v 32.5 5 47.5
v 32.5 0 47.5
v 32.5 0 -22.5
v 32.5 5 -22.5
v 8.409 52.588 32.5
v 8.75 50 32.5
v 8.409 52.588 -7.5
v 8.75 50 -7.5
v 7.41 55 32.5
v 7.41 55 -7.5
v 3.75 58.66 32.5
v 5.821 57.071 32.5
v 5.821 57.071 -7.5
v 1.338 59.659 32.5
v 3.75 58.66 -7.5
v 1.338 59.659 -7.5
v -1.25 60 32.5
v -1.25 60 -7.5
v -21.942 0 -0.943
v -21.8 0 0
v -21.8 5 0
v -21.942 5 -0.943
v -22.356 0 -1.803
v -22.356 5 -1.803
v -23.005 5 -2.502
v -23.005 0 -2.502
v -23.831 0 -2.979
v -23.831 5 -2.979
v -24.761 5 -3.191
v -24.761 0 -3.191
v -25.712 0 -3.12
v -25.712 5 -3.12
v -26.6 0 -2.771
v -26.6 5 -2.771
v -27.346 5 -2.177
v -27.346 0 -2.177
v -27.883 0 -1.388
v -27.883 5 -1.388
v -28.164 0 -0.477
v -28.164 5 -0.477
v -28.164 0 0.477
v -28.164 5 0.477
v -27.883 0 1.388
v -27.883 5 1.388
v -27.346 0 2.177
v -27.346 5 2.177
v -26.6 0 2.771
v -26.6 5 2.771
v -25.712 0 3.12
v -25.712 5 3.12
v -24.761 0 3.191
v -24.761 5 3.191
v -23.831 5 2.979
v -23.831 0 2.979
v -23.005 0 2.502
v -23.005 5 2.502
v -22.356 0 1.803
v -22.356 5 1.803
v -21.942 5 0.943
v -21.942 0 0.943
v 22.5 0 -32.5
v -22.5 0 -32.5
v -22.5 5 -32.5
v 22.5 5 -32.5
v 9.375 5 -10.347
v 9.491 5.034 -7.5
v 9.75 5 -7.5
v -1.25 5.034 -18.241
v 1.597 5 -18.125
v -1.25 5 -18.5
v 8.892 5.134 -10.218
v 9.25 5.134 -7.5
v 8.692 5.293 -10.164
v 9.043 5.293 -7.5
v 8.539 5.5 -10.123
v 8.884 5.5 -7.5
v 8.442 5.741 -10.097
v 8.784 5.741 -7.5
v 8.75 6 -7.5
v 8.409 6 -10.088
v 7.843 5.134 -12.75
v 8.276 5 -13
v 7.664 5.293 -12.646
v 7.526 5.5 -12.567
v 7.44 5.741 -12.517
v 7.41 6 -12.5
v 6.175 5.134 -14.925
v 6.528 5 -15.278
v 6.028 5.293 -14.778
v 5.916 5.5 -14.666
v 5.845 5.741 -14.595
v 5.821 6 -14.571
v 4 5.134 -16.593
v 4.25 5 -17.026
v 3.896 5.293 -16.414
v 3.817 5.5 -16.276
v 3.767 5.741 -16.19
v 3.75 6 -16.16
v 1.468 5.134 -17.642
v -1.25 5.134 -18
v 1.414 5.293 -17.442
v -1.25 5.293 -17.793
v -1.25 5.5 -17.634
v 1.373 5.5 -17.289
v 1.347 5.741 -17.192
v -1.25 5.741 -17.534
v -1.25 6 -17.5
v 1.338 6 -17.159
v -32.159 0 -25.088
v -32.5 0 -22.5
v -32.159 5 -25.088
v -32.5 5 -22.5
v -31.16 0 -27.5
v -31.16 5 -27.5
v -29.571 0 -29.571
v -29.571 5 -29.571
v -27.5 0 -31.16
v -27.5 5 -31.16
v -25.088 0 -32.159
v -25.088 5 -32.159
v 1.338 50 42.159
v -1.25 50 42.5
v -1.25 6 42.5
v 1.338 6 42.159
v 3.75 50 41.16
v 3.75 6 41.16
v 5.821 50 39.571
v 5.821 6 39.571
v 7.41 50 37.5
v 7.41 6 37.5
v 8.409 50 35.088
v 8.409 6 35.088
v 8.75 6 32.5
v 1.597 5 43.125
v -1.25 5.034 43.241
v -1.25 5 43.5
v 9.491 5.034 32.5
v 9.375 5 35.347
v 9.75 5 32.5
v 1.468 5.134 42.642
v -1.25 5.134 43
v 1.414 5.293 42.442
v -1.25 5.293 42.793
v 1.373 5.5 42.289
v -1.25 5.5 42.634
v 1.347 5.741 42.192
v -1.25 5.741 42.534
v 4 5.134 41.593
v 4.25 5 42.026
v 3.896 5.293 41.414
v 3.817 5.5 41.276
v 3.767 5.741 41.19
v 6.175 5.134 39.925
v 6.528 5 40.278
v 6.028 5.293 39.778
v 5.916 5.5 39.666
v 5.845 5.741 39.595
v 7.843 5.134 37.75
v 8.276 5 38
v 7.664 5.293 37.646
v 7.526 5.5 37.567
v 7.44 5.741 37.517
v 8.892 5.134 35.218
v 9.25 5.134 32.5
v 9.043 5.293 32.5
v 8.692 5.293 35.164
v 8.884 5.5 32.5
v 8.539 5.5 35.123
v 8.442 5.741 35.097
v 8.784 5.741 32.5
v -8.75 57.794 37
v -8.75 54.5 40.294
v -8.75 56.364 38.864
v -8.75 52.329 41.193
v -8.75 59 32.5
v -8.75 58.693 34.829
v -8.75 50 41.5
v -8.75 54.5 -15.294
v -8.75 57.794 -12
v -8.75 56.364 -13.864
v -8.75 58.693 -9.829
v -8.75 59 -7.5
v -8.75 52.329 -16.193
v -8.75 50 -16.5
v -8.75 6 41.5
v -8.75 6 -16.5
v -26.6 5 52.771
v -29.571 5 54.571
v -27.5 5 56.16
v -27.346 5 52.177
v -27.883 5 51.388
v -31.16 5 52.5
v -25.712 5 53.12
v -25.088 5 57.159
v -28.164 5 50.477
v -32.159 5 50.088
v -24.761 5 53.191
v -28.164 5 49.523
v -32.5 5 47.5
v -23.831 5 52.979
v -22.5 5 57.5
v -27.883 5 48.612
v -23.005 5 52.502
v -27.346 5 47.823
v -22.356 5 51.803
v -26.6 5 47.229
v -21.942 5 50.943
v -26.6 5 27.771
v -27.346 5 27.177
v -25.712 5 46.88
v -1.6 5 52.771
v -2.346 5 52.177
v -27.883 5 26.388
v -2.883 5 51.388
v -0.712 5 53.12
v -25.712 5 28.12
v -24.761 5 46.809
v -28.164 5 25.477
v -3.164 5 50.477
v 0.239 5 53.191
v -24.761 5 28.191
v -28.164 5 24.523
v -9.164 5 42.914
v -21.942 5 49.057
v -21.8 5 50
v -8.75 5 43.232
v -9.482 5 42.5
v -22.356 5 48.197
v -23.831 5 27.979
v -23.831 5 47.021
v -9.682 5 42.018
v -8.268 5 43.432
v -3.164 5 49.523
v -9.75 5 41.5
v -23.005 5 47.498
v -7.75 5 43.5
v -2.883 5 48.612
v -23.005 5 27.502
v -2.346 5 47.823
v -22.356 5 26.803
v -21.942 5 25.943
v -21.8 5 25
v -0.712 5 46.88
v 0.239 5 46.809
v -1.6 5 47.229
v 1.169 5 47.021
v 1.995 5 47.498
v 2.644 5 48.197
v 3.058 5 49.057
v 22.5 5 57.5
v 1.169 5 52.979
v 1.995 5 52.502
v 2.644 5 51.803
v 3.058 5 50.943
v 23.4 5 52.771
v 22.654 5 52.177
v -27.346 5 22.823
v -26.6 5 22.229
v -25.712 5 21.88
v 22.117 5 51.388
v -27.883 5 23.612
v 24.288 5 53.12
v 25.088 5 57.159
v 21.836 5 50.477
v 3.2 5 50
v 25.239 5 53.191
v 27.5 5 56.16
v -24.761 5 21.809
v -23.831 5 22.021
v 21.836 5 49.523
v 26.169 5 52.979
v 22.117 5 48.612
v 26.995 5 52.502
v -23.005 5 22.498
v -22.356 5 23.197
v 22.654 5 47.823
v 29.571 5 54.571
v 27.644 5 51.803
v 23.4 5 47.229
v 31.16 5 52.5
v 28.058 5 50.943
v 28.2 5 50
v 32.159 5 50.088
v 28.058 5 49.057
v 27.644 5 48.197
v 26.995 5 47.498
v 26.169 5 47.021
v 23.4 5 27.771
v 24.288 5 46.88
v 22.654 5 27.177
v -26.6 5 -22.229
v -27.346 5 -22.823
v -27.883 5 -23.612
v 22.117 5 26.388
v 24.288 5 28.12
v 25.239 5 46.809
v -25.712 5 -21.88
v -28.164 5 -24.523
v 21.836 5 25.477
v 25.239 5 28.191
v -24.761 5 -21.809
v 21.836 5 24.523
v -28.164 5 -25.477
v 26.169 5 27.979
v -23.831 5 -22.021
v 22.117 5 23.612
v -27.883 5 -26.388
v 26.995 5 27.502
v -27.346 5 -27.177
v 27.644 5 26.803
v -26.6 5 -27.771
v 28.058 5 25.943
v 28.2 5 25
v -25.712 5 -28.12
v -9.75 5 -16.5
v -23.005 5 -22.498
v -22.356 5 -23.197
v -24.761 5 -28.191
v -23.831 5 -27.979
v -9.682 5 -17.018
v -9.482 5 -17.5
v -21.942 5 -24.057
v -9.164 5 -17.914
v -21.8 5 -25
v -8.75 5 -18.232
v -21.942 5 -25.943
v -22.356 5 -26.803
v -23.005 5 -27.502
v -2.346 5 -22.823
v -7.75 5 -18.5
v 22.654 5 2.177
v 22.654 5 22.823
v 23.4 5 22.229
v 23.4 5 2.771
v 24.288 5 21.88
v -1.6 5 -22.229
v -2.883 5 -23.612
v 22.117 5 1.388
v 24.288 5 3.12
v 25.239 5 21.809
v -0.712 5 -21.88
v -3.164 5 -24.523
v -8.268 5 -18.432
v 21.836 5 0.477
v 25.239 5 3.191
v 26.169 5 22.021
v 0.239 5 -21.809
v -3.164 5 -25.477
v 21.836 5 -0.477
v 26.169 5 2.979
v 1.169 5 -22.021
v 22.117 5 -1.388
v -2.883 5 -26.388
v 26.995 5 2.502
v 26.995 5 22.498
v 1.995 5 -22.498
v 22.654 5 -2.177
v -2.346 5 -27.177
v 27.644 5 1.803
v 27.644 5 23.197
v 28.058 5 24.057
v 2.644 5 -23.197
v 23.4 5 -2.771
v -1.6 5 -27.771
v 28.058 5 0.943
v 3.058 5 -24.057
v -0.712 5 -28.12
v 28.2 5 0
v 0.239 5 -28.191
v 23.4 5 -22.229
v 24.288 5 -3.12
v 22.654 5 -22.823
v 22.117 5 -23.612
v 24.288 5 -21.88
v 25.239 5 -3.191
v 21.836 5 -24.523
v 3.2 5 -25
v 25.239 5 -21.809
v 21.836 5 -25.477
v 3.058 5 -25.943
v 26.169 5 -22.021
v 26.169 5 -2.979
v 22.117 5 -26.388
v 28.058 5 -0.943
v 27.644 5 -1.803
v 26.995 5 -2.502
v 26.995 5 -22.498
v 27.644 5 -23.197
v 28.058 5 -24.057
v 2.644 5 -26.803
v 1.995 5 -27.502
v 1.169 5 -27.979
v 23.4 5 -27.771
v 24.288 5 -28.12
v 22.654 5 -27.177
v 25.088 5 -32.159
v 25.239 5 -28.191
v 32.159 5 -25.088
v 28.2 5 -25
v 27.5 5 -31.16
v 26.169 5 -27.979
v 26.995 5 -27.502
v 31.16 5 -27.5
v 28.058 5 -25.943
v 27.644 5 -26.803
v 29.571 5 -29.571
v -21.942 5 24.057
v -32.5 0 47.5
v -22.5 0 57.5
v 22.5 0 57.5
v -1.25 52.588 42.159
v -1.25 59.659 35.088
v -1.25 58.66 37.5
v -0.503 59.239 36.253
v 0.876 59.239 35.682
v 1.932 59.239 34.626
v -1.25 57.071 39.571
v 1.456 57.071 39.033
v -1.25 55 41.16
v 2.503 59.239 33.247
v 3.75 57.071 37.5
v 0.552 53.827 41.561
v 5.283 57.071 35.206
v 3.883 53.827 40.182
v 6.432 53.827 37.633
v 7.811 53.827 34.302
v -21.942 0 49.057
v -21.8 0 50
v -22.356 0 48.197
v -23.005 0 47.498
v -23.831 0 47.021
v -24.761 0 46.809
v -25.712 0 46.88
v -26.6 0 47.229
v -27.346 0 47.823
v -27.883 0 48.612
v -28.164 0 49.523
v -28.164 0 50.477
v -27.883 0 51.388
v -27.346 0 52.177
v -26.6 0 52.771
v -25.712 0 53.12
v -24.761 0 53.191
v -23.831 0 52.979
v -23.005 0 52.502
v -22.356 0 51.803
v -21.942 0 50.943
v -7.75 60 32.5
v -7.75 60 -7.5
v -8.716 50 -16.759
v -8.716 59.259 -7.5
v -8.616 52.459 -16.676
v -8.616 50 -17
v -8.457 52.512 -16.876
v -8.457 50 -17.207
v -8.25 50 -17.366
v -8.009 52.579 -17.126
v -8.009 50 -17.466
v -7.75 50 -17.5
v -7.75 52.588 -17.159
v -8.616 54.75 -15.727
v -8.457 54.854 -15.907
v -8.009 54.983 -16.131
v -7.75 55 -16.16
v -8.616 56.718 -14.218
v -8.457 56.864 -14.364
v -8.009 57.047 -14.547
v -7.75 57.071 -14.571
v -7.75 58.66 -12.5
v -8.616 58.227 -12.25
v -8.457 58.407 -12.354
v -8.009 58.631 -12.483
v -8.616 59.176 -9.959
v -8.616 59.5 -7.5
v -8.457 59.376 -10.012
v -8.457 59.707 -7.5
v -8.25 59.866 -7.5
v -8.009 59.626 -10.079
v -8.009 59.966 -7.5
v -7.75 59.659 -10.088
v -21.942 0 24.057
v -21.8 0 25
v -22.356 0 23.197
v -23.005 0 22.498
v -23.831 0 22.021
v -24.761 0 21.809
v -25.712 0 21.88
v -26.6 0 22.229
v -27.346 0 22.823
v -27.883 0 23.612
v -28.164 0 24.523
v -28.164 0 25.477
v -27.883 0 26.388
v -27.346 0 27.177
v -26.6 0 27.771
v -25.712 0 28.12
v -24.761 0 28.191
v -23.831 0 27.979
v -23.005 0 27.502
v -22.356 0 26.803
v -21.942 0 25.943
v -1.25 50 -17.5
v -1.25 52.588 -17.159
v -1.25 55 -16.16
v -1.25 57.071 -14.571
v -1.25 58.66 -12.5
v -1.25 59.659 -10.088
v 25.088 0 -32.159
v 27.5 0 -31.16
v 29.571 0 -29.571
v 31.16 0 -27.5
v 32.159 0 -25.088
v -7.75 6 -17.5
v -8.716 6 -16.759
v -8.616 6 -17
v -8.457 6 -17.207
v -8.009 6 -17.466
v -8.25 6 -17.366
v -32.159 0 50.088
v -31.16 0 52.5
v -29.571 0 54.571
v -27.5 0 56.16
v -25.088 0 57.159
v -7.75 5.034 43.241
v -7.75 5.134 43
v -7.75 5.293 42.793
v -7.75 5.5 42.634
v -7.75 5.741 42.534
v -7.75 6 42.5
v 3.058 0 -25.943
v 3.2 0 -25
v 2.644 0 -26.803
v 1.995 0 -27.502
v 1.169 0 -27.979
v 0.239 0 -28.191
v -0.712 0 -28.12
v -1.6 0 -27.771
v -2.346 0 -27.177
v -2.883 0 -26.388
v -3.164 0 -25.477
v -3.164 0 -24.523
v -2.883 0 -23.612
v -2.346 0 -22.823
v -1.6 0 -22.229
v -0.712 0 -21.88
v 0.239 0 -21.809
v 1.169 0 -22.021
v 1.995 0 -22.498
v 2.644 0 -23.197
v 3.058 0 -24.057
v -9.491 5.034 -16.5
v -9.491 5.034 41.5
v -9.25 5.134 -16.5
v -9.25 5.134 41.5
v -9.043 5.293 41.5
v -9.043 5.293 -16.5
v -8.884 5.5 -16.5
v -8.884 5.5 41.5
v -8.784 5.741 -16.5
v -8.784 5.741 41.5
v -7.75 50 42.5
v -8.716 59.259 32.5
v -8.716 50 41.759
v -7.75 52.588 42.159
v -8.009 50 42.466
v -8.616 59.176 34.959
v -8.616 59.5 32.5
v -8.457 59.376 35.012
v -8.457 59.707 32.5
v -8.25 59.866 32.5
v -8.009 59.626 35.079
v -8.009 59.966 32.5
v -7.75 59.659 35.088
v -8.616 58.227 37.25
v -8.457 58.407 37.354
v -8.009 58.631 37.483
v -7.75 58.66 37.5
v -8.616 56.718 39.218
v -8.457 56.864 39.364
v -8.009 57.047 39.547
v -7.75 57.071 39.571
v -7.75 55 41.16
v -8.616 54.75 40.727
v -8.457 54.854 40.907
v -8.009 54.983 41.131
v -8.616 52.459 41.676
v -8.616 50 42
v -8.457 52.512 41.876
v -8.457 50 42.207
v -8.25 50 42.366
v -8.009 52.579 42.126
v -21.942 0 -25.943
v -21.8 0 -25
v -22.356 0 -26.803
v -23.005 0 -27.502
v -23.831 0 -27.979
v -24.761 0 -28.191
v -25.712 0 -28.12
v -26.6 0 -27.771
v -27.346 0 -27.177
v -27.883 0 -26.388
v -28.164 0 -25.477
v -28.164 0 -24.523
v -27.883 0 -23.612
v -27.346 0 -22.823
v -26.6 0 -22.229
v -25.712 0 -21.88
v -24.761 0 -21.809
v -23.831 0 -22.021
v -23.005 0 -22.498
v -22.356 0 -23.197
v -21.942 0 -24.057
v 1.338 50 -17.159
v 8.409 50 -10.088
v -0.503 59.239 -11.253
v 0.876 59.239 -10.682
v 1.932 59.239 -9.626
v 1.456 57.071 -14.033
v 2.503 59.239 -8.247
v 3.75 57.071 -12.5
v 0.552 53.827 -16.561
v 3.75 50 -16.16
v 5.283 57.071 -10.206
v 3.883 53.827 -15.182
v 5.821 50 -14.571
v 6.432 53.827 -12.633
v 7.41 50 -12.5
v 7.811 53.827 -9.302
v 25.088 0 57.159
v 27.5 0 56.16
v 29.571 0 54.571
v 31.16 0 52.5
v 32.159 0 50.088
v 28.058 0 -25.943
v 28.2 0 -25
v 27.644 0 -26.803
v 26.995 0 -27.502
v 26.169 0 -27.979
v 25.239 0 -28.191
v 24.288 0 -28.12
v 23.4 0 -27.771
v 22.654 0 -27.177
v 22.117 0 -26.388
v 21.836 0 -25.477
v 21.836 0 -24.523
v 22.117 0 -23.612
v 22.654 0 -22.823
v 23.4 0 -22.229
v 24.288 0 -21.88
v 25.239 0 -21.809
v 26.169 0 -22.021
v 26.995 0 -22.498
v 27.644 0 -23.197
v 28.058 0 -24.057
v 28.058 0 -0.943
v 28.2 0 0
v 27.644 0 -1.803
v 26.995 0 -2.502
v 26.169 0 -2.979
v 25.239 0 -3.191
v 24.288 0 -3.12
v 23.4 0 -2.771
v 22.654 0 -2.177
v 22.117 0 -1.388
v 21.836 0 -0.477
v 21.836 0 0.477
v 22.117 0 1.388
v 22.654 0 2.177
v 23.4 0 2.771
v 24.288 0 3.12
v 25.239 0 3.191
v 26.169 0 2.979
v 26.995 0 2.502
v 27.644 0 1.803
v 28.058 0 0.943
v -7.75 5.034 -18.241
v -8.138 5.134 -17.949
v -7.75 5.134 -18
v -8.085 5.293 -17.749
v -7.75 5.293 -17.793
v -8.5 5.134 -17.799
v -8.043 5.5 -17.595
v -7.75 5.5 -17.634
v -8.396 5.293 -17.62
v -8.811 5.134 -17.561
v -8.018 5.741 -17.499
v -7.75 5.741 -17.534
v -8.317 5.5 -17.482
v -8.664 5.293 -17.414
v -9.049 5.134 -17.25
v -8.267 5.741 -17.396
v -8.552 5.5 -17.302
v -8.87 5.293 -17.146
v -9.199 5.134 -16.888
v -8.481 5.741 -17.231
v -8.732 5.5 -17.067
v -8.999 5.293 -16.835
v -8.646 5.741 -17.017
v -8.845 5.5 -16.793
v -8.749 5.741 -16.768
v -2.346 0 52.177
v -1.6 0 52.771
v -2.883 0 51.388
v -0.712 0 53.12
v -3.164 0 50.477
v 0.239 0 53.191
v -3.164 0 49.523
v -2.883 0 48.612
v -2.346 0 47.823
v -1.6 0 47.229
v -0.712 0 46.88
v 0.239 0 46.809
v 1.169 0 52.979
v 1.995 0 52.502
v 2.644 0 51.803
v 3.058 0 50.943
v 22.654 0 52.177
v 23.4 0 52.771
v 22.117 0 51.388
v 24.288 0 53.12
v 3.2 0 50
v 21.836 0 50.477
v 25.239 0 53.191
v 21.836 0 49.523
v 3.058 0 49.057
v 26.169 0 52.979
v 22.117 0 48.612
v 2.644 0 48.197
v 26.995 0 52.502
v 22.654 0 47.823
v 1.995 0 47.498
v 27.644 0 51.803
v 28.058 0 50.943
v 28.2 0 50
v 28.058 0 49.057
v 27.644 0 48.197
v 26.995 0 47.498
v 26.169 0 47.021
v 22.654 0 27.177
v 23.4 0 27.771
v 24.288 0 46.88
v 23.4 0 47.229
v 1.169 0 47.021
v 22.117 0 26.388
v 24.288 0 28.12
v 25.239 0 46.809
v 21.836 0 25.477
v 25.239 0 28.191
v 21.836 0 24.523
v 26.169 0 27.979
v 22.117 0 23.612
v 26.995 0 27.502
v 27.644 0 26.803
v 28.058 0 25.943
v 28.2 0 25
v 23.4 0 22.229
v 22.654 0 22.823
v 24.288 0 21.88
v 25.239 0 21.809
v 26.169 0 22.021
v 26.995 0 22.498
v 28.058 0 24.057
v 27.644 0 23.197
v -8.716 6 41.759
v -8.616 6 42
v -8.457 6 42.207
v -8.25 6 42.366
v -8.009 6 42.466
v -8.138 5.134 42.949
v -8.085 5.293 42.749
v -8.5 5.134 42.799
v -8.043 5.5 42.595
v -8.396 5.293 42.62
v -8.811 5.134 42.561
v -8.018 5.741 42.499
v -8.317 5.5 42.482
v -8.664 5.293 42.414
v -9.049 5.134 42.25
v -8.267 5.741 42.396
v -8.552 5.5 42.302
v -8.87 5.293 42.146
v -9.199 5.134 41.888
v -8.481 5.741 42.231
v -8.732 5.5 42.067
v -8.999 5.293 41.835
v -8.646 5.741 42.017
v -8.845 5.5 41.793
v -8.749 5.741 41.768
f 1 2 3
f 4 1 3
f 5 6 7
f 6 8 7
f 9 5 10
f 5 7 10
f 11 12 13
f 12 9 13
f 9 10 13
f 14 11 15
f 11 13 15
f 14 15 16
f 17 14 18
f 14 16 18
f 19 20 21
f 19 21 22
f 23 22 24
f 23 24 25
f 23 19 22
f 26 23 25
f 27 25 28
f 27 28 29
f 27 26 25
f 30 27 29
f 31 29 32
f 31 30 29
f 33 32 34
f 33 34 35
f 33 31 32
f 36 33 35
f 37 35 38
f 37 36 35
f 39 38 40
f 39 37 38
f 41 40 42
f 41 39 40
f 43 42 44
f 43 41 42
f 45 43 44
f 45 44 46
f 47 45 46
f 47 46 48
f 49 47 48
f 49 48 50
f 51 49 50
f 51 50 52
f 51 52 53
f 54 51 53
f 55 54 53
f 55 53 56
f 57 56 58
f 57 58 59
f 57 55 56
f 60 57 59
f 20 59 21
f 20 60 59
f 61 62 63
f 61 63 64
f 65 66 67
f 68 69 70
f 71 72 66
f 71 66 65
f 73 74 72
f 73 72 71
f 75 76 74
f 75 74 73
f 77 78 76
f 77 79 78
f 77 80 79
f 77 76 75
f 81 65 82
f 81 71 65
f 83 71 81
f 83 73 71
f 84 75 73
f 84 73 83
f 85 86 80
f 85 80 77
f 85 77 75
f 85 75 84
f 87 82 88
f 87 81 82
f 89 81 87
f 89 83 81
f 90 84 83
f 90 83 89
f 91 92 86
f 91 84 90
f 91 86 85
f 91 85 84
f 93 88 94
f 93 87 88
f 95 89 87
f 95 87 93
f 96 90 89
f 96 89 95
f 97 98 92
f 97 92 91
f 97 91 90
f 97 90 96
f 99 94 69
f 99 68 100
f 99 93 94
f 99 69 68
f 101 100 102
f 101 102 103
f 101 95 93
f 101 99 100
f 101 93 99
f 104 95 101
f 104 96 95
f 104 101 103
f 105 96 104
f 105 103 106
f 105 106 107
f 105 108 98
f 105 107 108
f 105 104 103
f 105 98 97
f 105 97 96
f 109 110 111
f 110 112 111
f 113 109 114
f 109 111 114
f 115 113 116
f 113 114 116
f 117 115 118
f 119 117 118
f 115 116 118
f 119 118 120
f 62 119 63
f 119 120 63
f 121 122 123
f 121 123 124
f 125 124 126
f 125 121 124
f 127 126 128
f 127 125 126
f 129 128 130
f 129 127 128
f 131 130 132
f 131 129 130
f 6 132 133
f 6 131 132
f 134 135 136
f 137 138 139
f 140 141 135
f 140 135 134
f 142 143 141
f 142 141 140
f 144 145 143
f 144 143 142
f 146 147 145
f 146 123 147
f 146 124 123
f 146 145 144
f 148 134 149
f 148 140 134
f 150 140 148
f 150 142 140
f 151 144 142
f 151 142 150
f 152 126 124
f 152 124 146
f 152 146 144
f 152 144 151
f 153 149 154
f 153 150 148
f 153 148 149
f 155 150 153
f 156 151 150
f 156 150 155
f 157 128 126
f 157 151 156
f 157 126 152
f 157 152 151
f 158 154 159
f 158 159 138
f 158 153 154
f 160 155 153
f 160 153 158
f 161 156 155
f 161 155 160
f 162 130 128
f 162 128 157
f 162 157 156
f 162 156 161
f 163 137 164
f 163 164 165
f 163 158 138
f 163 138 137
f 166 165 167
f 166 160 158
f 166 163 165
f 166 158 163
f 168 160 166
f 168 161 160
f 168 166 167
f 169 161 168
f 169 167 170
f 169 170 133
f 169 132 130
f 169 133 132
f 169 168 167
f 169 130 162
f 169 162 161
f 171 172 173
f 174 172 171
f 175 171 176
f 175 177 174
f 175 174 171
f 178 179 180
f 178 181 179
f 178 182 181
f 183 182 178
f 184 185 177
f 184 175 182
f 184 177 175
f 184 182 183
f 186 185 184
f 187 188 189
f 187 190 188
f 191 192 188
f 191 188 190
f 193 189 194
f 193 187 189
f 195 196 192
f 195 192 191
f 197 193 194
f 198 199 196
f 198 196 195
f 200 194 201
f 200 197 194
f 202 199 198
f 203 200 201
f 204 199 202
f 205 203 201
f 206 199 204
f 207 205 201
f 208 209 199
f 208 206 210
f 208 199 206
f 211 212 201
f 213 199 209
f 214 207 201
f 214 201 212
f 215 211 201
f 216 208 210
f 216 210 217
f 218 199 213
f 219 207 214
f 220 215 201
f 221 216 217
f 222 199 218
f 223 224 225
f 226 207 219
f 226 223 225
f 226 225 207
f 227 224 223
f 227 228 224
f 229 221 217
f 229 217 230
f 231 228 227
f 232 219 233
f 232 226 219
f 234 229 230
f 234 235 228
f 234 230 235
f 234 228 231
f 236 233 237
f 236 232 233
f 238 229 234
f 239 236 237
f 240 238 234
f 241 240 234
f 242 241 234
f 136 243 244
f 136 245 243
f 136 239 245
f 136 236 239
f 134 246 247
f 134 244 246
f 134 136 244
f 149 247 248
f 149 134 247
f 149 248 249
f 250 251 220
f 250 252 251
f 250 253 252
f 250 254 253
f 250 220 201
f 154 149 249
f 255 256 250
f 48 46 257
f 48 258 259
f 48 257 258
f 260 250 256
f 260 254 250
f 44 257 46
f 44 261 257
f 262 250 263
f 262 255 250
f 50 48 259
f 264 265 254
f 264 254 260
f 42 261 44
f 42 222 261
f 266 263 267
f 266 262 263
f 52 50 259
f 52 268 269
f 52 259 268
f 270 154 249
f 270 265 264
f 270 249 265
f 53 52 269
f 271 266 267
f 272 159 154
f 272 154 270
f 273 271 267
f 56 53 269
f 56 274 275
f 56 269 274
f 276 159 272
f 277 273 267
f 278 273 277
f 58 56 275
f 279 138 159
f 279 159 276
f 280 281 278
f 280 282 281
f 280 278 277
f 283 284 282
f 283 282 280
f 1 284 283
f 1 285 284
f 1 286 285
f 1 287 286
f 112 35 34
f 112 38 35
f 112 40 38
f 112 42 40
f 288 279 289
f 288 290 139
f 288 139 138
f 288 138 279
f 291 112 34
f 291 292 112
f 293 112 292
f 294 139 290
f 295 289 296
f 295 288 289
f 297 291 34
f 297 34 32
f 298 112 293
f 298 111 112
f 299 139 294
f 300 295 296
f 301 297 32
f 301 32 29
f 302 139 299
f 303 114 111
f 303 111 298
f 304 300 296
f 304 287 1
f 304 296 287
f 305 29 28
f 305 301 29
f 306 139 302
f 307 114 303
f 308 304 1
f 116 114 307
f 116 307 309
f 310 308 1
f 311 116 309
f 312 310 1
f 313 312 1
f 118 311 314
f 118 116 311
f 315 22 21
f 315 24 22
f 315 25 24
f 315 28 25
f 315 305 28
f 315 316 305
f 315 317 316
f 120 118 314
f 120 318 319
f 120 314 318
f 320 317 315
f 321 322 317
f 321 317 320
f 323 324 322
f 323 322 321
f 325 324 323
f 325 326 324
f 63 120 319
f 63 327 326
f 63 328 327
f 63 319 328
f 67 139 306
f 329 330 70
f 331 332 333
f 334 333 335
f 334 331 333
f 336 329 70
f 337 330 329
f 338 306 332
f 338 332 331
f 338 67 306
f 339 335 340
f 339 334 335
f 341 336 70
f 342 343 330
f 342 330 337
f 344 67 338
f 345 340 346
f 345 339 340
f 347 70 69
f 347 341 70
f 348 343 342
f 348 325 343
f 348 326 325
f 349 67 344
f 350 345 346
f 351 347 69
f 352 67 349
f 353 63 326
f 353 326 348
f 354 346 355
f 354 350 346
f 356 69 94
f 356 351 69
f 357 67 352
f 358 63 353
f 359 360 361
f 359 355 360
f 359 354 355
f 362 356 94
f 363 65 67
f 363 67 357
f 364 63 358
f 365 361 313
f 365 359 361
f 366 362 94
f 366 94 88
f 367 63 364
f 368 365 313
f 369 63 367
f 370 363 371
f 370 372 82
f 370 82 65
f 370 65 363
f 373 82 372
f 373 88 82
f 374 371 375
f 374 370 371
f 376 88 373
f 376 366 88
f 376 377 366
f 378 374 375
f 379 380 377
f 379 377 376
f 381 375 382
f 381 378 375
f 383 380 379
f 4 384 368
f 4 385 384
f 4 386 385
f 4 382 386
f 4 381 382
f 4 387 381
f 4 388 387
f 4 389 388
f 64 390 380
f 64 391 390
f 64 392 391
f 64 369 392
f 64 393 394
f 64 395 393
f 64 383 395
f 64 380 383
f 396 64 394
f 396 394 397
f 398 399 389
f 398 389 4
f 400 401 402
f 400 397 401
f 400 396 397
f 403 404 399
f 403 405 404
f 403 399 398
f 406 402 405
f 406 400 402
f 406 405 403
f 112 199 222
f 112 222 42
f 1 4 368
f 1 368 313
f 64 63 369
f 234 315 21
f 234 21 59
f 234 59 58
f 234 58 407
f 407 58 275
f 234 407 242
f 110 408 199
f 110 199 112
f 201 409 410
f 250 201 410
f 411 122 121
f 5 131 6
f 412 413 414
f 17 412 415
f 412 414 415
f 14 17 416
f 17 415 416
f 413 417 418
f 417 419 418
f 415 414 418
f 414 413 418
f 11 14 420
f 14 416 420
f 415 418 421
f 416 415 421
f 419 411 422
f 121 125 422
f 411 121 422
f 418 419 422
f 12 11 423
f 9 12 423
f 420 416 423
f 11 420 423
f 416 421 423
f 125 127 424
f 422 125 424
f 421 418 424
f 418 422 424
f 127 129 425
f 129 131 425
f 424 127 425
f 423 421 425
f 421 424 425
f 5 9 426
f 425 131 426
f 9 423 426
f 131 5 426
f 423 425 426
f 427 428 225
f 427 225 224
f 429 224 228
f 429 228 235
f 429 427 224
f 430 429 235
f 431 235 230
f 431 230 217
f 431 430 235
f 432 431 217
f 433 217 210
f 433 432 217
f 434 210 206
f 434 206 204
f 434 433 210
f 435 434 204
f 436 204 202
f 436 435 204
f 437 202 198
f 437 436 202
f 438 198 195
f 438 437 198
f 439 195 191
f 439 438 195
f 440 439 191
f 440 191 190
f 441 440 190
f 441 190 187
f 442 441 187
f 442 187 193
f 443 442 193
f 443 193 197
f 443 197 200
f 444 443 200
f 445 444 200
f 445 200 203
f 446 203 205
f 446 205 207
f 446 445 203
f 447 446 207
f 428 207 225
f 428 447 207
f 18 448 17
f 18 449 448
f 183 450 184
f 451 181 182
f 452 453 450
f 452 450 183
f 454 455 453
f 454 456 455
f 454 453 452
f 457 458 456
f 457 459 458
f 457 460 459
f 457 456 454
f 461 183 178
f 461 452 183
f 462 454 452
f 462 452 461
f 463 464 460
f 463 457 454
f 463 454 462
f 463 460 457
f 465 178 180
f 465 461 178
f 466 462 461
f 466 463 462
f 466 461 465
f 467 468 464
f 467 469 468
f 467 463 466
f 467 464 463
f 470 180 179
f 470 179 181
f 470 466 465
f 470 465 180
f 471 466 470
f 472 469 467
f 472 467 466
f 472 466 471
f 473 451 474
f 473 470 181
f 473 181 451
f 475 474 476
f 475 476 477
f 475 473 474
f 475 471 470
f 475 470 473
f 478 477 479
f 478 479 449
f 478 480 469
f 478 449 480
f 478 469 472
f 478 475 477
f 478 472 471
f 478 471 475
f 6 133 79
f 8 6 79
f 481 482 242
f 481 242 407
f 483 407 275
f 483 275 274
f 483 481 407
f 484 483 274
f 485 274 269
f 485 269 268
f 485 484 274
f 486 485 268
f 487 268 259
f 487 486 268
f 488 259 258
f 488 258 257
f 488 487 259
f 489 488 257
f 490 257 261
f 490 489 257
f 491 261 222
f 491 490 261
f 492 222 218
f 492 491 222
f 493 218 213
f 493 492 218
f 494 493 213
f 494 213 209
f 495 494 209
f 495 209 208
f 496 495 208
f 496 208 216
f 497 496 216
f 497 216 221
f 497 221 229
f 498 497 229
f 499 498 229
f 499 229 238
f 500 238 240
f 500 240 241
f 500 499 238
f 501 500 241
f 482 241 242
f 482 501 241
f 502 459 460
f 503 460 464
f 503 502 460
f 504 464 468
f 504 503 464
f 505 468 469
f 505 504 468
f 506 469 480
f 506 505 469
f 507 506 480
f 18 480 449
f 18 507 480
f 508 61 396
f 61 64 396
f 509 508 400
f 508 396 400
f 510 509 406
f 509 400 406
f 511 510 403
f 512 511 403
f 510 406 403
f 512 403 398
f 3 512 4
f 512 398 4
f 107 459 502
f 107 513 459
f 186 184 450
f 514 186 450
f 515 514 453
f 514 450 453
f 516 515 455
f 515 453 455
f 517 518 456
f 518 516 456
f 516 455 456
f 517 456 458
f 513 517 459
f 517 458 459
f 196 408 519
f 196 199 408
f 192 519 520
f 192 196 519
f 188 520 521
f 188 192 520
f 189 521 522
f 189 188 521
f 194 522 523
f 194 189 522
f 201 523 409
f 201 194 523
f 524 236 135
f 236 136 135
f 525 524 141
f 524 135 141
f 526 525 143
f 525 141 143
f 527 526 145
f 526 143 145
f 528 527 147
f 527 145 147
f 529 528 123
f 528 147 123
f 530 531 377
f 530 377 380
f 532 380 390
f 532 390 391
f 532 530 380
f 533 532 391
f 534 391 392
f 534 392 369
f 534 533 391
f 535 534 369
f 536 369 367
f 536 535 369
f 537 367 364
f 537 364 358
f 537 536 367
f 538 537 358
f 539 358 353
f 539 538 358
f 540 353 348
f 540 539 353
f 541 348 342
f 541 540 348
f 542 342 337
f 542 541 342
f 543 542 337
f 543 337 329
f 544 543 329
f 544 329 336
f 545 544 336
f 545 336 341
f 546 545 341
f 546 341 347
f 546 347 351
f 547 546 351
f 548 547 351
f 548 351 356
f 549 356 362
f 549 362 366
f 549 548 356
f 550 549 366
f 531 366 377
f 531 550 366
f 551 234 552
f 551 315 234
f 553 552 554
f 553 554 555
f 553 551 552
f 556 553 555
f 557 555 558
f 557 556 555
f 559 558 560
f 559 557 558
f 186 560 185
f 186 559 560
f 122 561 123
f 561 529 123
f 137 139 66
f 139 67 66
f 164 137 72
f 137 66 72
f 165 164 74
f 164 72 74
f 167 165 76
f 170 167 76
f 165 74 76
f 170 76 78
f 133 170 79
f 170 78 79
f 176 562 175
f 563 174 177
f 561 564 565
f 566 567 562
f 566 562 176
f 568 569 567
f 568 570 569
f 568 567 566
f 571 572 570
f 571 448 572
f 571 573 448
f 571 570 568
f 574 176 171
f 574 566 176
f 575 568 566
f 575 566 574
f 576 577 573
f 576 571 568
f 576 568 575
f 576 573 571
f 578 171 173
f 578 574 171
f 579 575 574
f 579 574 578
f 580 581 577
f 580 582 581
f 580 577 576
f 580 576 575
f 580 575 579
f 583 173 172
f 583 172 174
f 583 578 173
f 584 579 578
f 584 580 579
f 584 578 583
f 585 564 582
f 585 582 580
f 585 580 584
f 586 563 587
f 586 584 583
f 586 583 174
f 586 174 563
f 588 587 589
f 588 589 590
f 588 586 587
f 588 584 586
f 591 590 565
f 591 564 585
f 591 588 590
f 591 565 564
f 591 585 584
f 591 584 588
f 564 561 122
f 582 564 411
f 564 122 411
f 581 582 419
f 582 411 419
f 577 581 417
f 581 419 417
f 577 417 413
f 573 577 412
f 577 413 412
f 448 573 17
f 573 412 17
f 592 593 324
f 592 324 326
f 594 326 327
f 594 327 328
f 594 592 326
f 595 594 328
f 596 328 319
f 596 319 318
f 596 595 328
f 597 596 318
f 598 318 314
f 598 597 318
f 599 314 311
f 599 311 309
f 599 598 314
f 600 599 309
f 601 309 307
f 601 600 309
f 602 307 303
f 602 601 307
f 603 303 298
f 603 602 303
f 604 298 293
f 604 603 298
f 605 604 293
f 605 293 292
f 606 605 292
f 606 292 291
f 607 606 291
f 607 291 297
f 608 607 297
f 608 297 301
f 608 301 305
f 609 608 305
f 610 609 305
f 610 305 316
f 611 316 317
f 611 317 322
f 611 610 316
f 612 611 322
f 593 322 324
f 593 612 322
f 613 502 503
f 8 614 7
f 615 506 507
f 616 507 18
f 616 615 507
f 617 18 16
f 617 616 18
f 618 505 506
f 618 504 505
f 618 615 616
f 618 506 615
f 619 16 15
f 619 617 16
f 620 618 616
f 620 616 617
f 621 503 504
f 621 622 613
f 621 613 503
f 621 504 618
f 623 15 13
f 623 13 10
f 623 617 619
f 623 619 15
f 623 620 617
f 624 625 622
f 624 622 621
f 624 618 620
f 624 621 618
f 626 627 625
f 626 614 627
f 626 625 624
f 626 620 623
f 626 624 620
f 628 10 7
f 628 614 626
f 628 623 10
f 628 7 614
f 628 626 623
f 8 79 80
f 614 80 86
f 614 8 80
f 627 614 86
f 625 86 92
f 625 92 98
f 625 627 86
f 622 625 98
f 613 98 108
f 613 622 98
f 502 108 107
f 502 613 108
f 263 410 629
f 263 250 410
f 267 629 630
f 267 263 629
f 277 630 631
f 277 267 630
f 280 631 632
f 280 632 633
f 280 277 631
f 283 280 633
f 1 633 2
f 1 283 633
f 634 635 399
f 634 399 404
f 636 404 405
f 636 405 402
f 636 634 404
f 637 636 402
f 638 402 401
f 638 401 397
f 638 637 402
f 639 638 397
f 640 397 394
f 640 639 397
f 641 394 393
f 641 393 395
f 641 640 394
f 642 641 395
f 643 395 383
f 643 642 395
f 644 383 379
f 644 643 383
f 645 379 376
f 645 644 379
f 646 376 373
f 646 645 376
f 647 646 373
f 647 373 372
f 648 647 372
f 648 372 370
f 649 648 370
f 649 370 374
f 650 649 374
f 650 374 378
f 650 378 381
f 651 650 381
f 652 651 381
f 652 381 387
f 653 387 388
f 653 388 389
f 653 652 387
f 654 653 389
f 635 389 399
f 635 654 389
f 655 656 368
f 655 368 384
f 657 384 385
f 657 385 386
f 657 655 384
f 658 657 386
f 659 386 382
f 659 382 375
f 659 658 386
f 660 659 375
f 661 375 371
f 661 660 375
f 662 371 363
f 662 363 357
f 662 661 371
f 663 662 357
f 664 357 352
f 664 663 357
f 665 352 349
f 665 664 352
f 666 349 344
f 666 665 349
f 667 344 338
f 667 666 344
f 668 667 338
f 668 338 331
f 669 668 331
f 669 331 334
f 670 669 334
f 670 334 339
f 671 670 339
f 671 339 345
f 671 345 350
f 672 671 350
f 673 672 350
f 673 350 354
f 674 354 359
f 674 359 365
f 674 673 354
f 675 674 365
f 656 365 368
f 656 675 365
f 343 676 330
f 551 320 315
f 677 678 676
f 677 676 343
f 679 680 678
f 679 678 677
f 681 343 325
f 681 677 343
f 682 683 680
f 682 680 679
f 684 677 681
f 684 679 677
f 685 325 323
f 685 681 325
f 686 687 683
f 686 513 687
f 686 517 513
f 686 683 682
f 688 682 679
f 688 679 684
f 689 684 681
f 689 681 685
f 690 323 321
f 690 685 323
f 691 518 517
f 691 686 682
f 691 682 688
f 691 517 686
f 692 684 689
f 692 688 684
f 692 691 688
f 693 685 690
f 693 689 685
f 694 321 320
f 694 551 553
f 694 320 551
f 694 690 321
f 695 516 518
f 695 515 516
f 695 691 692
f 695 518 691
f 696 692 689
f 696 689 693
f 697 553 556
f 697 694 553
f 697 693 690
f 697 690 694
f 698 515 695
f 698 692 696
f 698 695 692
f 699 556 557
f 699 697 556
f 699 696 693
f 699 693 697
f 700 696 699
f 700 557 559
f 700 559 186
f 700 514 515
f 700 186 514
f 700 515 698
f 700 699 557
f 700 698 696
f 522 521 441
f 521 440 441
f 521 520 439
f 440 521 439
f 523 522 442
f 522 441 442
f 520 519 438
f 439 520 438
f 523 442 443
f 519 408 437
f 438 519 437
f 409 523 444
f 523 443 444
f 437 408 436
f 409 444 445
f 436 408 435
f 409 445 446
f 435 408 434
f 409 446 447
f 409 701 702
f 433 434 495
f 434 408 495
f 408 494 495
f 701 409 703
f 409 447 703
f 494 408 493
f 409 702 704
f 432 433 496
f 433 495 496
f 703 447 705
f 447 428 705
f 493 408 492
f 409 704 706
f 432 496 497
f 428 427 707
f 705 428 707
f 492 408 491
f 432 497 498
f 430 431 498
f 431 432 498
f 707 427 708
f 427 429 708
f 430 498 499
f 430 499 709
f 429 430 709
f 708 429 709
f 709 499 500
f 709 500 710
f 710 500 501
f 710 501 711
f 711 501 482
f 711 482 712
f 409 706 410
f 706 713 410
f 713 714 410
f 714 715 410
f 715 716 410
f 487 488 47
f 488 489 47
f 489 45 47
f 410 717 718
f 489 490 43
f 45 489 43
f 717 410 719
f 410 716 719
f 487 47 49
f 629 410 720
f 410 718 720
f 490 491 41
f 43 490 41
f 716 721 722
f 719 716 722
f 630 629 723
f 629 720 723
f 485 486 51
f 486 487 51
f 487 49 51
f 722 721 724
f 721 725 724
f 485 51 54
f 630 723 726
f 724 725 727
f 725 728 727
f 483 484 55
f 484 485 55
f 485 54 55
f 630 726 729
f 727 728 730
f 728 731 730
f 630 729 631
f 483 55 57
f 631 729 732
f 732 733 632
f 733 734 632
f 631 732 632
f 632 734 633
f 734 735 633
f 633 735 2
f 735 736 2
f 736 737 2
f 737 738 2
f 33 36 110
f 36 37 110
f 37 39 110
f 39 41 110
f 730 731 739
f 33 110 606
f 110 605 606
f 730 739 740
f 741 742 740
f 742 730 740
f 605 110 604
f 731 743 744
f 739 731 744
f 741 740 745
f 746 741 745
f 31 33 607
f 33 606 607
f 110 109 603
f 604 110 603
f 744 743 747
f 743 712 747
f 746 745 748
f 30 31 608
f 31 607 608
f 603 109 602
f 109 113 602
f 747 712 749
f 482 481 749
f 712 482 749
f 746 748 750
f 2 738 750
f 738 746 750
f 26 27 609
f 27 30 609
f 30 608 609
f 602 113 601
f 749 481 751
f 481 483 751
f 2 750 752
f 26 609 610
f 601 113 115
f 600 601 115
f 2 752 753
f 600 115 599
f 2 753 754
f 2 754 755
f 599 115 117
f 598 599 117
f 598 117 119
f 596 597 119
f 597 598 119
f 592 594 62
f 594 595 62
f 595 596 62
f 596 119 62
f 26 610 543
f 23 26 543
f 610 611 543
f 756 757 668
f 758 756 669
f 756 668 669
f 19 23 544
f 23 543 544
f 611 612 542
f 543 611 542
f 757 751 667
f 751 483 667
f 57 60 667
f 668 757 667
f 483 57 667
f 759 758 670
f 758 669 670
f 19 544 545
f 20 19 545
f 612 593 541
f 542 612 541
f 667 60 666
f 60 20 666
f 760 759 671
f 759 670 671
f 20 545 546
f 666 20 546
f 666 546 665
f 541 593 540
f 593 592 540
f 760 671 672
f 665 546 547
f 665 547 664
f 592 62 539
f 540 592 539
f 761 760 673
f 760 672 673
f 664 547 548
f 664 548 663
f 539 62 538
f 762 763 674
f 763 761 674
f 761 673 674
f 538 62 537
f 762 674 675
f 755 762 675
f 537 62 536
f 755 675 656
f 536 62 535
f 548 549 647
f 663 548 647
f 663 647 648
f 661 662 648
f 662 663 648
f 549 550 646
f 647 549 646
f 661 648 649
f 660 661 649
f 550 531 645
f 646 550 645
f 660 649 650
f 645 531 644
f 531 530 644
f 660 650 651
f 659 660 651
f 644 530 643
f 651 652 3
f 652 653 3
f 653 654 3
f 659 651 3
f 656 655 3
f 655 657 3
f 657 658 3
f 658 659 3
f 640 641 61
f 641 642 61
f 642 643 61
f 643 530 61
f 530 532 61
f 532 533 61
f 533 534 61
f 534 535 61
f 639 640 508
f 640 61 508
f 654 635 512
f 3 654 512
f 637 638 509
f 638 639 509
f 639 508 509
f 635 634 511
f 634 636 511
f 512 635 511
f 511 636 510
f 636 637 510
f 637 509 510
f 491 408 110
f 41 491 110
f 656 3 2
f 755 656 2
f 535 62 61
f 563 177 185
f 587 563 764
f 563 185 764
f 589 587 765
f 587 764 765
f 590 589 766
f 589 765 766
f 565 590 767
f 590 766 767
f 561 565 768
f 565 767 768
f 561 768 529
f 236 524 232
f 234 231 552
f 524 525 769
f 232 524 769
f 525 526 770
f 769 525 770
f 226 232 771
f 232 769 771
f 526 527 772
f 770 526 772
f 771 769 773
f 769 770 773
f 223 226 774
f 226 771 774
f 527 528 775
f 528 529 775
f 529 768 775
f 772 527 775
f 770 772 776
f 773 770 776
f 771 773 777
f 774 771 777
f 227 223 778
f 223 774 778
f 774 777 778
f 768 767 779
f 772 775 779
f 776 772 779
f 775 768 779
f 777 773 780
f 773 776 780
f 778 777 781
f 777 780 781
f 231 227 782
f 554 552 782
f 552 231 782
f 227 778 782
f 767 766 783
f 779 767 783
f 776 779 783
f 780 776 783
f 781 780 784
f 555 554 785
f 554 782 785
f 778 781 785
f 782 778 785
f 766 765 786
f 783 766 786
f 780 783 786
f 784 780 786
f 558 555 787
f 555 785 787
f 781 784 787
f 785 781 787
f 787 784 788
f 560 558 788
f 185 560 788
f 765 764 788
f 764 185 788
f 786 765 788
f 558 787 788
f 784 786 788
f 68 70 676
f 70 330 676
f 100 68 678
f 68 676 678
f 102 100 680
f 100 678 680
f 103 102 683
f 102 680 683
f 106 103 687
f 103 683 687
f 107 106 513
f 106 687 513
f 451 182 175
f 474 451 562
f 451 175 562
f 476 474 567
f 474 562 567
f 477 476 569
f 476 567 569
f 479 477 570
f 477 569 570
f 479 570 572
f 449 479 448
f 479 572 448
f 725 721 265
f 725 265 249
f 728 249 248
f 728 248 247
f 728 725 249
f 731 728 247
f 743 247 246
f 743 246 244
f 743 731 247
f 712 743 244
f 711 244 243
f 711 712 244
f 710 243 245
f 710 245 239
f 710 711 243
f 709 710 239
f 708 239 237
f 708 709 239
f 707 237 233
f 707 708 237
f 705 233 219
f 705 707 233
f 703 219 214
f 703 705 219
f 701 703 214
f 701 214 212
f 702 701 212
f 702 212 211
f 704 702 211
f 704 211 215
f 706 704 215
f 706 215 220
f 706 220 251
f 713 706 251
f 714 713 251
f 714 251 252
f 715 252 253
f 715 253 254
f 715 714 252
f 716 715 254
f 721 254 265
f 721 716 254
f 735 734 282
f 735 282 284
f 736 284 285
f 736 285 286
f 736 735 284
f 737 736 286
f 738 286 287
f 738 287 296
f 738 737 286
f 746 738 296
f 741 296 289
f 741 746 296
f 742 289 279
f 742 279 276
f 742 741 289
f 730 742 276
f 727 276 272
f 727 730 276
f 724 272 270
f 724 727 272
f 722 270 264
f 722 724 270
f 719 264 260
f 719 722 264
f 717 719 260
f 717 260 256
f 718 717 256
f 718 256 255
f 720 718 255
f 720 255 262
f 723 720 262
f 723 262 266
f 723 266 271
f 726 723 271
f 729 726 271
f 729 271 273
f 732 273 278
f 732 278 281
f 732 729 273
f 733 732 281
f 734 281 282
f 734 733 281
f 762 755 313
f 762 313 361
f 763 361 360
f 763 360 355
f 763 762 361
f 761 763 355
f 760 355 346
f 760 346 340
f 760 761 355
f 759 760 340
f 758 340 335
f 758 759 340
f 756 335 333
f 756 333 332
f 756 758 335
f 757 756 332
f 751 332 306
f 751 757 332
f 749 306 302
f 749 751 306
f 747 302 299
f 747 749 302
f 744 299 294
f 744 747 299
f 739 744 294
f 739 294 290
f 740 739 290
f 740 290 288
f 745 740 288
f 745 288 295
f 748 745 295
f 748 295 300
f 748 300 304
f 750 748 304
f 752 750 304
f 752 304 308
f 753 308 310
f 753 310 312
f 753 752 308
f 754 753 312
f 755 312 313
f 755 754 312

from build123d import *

# Parameters (mm, degrees)
SKETCH_1_W      = 65
SKETCH_1_H      = 90
SKETCH_1_R      = 3.2
EXTRUDE_1_DEPTH = 5
FILLET_1_R      = 10
SKETCH_2_W      = 17.5
SKETCH_2_H      = 60
EXTRUDE_2_DEPTH = 55
FILLET_2_R      = 10
FILLET_3_R      = 1


with BuildPart() as part:
    # 스케치1 → 보스-돌출1 (new body)
    with BuildSketch(Plane(origin=(0, 0, 0), x_dir=(1, 0, 0), z_dir=(0, 1, 0))):
        with Locations((0, -12.5)):
            Rectangle(SKETCH_1_W, SKETCH_1_H)
        with Locations((-25, 25)):
            Circle(SKETCH_1_R, mode=Mode.SUBTRACT)
        with Locations((25, 25)):
            Circle(SKETCH_1_R, mode=Mode.SUBTRACT)
        with Locations((25, 0)):
            Circle(SKETCH_1_R, mode=Mode.SUBTRACT)
        with Locations((-25, 0)):
            Circle(SKETCH_1_R, mode=Mode.SUBTRACT)
        with Locations((25, -50)):
            Circle(SKETCH_1_R, mode=Mode.SUBTRACT)
        with Locations((-25, -50)):
            Circle(SKETCH_1_R, mode=Mode.SUBTRACT)
        with Locations((0, 25)):
            Circle(SKETCH_1_R, mode=Mode.SUBTRACT)
        with Locations((0, -50)):
            Circle(SKETCH_1_R, mode=Mode.SUBTRACT)
        with Locations((25, -25)):
            Circle(SKETCH_1_R, mode=Mode.SUBTRACT)
        with Locations((-25, -25)):
            Circle(SKETCH_1_R, mode=Mode.SUBTRACT)
    extrude(amount=EXTRUDE_1_DEPTH)

    # 필렛1
    fillet_1_edges = [part.edges().sort_by_distance(p)[0] for p in [
        (-32.5, 2.5, -32.5),
        (32.5, 2.5, -32.5),
        (32.5, 2.5, 57.5),
        (-32.5, 2.5, 57.5),
    ]]
    fillet(fillet_1_edges, radius=FILLET_1_R)

    # 스케치2 → 보스-돌출2 (add)
    with BuildSketch(Plane(origin=(0, 5, 0), x_dir=(1, 0, 0), z_dir=(0, 1, 0))):
        with Locations((0, -12.5)):
            Rectangle(SKETCH_2_W, SKETCH_2_H)
    extrude(amount=EXTRUDE_2_DEPTH)

    # 필렛2
    fillet_2_edges = [part.edges().sort_by_distance(p)[0] for p in [
        (8.75, 32.5, 42.5),
        (8.75, 32.5, -17.5),
        (0, 60, -17.5),
        (0, 60, 42.5),
        (8.75, 60, 12.5),
    ]]
    fillet(fillet_2_edges, radius=FILLET_2_R)

    # 필렛3
    fillet_3_edges = [part.edges().sort_by_distance(p)[0] for p in [
        (-8.75, 57.071067812, -14.571067812),
        (5.821067812, 5, -14.571067812),
        (5.821067812, 5, 39.571067812),
        (-8.75, 5, 12.5),
        (-5, 5, 42.5),
        (-8.75, 60, 12.5),
        (8.75, 5, 12.5),
        (-5, 5, -17.5),
        (-8.75, 27.5, -17.5),
        (-8.75, 27.5, 42.5),
        (-8.75, 57.071067812, 39.571067812),
    ]]
    fillet(fillet_3_edges, radius=FILLET_3_R)


solid = part.part
